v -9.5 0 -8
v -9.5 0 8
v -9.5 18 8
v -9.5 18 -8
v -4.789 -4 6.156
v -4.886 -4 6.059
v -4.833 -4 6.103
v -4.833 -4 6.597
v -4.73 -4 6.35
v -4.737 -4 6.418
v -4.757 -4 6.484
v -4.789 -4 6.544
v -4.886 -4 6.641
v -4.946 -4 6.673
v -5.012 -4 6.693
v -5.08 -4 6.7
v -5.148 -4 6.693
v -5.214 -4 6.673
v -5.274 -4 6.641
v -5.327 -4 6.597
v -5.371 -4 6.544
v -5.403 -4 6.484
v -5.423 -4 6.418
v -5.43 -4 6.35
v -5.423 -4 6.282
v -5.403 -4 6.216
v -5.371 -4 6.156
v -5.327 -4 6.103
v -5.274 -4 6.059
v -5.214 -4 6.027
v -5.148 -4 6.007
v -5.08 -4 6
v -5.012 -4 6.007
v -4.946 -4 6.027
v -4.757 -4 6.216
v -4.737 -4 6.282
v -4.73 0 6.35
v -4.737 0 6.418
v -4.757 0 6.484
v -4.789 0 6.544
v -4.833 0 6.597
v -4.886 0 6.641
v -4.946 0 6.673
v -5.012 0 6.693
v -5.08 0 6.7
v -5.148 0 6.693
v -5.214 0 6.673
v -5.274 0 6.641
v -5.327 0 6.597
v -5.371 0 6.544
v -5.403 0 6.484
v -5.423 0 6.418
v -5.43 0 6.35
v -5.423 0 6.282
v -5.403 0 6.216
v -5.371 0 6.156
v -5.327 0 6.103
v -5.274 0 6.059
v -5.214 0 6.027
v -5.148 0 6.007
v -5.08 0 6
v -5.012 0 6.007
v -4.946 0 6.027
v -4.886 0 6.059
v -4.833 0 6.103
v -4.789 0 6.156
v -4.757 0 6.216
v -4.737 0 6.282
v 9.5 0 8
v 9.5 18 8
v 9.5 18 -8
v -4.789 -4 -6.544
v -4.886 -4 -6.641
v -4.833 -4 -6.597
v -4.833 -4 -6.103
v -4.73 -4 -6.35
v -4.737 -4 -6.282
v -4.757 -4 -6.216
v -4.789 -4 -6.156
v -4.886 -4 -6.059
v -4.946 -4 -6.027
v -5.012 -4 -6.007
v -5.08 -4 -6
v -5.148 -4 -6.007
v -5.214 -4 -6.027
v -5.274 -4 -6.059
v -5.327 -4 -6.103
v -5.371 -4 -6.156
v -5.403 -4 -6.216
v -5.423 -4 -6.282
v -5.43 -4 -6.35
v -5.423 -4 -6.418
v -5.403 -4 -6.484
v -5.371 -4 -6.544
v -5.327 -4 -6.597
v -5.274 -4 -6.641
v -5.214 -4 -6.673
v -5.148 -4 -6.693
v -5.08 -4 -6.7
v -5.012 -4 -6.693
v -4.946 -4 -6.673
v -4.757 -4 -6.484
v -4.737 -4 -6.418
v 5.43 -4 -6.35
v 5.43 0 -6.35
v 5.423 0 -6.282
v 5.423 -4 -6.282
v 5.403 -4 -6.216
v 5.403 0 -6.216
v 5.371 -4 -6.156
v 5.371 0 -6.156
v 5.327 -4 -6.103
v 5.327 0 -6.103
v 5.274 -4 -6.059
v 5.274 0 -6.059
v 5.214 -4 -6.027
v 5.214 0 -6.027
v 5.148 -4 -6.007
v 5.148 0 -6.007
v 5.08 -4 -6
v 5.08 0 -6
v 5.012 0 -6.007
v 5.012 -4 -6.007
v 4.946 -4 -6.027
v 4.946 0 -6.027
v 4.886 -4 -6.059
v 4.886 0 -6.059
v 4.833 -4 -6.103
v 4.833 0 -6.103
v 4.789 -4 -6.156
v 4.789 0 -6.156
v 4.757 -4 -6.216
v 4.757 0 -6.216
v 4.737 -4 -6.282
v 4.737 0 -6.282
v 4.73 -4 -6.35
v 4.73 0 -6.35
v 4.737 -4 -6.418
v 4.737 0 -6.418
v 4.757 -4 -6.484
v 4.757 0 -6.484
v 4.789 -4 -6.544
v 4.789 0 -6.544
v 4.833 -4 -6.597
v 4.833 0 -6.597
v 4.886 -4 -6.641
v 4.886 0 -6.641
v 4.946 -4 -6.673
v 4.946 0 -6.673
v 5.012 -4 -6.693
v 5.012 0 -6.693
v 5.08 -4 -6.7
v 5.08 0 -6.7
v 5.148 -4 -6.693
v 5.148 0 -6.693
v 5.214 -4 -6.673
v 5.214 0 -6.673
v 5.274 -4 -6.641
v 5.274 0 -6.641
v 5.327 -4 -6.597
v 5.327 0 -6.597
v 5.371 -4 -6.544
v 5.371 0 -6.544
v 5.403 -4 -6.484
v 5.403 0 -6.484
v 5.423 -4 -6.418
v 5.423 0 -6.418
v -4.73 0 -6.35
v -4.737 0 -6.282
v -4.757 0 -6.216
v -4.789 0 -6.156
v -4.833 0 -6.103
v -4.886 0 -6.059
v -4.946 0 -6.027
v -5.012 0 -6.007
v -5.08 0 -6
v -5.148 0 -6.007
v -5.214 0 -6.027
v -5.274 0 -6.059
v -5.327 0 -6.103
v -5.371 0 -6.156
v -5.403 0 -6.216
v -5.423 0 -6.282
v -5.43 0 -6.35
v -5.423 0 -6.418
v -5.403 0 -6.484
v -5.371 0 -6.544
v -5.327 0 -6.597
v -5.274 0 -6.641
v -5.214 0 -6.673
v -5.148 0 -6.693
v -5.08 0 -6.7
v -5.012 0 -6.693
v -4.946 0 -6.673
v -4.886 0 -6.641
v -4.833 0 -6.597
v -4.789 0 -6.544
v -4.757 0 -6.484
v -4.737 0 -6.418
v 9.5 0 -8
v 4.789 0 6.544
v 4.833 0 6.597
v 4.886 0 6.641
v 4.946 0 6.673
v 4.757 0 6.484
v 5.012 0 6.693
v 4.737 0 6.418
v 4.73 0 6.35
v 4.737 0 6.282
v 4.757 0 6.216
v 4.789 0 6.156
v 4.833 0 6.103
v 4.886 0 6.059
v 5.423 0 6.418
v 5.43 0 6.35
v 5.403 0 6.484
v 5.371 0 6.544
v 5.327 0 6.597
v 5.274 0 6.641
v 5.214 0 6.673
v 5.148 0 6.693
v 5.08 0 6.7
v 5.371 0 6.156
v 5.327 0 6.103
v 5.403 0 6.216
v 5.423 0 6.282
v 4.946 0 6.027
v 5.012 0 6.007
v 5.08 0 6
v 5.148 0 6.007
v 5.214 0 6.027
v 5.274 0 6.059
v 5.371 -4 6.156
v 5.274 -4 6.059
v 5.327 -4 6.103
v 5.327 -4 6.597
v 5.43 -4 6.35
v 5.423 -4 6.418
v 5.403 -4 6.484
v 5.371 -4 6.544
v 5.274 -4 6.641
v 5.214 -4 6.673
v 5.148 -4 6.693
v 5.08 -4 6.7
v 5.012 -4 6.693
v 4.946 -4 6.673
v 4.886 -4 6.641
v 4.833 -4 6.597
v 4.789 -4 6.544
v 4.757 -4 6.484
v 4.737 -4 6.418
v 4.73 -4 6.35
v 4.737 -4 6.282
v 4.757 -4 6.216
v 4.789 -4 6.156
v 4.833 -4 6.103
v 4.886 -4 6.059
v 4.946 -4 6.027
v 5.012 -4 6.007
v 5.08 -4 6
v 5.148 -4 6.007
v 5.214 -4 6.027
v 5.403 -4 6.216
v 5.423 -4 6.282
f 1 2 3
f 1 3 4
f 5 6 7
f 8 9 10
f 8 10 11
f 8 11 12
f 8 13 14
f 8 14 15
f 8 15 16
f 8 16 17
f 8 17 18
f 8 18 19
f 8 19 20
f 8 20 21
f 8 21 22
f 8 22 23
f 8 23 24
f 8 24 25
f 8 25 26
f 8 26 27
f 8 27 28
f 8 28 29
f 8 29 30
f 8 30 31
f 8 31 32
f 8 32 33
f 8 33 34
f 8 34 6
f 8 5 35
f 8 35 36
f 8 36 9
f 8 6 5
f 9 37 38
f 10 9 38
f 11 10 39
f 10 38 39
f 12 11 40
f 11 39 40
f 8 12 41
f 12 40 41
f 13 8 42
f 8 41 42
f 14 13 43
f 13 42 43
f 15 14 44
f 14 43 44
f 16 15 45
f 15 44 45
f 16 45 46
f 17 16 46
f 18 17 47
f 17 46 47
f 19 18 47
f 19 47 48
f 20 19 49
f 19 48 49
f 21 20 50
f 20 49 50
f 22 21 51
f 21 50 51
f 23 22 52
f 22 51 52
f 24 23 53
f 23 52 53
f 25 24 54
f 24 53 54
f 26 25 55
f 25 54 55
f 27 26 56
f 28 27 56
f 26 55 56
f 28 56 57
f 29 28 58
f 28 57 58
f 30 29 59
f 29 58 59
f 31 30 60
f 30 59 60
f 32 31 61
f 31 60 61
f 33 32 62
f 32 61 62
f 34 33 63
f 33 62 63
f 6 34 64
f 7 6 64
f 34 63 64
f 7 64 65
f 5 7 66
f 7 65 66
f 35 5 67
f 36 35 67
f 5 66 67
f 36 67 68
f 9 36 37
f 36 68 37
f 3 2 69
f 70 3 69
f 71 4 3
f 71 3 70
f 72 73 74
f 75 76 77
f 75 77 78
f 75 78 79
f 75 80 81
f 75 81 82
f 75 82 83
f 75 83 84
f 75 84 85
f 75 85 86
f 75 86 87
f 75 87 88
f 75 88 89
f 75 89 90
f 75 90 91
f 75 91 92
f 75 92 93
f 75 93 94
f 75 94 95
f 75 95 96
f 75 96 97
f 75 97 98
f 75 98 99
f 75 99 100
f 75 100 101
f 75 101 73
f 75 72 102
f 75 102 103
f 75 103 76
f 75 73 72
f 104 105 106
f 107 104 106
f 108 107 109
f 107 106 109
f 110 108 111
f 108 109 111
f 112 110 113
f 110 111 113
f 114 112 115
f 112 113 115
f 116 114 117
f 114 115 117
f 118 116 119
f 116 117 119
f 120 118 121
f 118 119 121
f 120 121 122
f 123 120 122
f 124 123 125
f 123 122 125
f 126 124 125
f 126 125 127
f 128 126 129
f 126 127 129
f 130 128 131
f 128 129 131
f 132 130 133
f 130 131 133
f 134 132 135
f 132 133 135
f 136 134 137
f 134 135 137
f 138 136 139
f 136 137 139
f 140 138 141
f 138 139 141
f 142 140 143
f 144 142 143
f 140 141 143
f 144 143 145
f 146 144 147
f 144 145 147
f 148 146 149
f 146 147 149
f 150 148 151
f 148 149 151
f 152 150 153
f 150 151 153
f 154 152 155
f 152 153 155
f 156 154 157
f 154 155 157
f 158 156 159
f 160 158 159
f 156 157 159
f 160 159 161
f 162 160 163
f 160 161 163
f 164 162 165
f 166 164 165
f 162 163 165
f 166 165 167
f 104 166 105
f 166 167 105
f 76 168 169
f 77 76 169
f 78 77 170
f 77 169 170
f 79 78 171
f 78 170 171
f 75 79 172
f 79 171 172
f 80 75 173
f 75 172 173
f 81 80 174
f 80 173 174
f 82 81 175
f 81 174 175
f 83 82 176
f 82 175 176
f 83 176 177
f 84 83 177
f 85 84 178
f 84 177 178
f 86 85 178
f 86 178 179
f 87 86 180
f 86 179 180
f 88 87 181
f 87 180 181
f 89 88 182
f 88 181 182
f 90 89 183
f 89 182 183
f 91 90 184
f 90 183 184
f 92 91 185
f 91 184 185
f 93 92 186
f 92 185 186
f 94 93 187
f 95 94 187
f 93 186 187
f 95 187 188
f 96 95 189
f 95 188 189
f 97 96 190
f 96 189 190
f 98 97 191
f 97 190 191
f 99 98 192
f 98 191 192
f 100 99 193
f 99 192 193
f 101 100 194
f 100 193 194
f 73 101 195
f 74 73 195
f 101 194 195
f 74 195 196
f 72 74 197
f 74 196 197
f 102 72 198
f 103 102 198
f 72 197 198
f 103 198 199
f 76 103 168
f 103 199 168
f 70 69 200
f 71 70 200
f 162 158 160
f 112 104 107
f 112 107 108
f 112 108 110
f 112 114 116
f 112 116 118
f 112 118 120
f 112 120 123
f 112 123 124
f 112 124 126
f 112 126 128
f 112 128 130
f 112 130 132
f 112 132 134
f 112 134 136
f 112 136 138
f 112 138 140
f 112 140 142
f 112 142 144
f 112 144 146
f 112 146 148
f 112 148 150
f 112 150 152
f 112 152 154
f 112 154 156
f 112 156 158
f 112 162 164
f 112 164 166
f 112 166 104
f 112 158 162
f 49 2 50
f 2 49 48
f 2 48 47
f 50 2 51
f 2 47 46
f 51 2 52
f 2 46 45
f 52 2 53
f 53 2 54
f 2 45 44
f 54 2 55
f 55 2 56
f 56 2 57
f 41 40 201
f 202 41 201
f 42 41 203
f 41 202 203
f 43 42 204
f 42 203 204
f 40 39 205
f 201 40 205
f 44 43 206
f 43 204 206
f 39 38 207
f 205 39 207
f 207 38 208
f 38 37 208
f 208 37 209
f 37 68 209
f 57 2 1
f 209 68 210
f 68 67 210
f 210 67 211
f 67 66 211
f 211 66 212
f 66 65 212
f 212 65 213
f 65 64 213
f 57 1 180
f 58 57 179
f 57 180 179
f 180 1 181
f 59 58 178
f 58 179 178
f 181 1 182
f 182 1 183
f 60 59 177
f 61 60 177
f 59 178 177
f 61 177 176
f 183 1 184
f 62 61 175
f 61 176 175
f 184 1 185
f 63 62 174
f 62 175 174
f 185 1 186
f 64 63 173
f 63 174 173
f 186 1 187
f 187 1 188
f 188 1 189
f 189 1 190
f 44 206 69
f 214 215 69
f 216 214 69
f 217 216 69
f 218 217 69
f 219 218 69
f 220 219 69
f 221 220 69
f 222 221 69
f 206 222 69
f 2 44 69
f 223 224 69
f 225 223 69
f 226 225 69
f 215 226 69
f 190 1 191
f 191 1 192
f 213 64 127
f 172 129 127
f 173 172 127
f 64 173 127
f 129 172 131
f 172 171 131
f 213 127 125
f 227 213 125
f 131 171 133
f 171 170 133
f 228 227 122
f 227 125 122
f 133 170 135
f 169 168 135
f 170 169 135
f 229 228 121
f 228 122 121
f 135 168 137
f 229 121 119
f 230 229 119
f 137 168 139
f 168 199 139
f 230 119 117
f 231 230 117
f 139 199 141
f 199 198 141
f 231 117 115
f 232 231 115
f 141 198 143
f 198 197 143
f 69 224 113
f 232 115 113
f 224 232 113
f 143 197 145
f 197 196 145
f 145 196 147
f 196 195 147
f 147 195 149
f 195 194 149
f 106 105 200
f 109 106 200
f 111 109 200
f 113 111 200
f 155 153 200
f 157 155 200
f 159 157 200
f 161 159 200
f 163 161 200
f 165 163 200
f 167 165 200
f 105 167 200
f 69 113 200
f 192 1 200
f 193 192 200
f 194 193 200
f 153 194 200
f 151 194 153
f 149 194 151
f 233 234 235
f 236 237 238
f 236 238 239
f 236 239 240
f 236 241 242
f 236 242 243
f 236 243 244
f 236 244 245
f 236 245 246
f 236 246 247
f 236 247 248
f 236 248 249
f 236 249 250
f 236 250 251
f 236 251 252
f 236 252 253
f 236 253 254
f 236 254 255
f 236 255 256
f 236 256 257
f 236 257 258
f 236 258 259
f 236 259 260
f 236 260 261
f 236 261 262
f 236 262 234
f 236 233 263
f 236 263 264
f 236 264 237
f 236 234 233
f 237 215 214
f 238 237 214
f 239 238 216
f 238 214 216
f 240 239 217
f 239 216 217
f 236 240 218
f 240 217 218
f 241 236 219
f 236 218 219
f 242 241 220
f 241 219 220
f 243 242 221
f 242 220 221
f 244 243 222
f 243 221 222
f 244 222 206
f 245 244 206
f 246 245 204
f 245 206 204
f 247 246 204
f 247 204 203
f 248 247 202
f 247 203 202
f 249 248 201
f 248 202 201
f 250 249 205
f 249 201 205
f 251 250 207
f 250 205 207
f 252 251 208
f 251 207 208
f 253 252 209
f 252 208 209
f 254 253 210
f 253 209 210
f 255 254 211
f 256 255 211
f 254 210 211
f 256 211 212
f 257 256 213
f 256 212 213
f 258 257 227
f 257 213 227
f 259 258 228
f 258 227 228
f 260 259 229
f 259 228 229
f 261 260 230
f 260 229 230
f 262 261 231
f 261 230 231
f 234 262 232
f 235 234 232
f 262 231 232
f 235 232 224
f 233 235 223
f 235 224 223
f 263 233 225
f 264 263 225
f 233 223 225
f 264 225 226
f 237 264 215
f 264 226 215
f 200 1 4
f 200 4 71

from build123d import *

# Parameters (mm, degrees)
CROQUIS1_W              = 19
CROQUIS1_H              = 16
SALIENTE_EXTRUIR1_DEPTH = 18
CROQUIS2_R              = 0.35
SALIENTE_EXTRUIR2_DEPTH = 4


with BuildPart() as part:
    # Croquis1 → Saliente-Extruir1 (new body)
    with BuildSketch(Plane(origin=(0, 0, 0), x_dir=(1, 0, 0), z_dir=(0, 1, 0))):
        Rectangle(CROQUIS1_W, CROQUIS1_H)
    extrude(amount=SALIENTE_EXTRUIR1_DEPTH)

    # Croquis2 → Saliente-Extruir2 (add)
    with BuildSketch(Plane.XZ):
        with Locations((-5.08, 6.35)):
            Circle(CROQUIS2_R)
        with Locations((5.08, 6.35)):
            Circle(CROQUIS2_R)
        with Locations((5.08, -6.35)):
            Circle(CROQUIS2_R)
        with Locations((-5.08, -6.35)):
            Circle(CROQUIS2_R)
    extrude(amount=SALIENTE_EXTRUIR2_DEPTH)


solid = part.part
